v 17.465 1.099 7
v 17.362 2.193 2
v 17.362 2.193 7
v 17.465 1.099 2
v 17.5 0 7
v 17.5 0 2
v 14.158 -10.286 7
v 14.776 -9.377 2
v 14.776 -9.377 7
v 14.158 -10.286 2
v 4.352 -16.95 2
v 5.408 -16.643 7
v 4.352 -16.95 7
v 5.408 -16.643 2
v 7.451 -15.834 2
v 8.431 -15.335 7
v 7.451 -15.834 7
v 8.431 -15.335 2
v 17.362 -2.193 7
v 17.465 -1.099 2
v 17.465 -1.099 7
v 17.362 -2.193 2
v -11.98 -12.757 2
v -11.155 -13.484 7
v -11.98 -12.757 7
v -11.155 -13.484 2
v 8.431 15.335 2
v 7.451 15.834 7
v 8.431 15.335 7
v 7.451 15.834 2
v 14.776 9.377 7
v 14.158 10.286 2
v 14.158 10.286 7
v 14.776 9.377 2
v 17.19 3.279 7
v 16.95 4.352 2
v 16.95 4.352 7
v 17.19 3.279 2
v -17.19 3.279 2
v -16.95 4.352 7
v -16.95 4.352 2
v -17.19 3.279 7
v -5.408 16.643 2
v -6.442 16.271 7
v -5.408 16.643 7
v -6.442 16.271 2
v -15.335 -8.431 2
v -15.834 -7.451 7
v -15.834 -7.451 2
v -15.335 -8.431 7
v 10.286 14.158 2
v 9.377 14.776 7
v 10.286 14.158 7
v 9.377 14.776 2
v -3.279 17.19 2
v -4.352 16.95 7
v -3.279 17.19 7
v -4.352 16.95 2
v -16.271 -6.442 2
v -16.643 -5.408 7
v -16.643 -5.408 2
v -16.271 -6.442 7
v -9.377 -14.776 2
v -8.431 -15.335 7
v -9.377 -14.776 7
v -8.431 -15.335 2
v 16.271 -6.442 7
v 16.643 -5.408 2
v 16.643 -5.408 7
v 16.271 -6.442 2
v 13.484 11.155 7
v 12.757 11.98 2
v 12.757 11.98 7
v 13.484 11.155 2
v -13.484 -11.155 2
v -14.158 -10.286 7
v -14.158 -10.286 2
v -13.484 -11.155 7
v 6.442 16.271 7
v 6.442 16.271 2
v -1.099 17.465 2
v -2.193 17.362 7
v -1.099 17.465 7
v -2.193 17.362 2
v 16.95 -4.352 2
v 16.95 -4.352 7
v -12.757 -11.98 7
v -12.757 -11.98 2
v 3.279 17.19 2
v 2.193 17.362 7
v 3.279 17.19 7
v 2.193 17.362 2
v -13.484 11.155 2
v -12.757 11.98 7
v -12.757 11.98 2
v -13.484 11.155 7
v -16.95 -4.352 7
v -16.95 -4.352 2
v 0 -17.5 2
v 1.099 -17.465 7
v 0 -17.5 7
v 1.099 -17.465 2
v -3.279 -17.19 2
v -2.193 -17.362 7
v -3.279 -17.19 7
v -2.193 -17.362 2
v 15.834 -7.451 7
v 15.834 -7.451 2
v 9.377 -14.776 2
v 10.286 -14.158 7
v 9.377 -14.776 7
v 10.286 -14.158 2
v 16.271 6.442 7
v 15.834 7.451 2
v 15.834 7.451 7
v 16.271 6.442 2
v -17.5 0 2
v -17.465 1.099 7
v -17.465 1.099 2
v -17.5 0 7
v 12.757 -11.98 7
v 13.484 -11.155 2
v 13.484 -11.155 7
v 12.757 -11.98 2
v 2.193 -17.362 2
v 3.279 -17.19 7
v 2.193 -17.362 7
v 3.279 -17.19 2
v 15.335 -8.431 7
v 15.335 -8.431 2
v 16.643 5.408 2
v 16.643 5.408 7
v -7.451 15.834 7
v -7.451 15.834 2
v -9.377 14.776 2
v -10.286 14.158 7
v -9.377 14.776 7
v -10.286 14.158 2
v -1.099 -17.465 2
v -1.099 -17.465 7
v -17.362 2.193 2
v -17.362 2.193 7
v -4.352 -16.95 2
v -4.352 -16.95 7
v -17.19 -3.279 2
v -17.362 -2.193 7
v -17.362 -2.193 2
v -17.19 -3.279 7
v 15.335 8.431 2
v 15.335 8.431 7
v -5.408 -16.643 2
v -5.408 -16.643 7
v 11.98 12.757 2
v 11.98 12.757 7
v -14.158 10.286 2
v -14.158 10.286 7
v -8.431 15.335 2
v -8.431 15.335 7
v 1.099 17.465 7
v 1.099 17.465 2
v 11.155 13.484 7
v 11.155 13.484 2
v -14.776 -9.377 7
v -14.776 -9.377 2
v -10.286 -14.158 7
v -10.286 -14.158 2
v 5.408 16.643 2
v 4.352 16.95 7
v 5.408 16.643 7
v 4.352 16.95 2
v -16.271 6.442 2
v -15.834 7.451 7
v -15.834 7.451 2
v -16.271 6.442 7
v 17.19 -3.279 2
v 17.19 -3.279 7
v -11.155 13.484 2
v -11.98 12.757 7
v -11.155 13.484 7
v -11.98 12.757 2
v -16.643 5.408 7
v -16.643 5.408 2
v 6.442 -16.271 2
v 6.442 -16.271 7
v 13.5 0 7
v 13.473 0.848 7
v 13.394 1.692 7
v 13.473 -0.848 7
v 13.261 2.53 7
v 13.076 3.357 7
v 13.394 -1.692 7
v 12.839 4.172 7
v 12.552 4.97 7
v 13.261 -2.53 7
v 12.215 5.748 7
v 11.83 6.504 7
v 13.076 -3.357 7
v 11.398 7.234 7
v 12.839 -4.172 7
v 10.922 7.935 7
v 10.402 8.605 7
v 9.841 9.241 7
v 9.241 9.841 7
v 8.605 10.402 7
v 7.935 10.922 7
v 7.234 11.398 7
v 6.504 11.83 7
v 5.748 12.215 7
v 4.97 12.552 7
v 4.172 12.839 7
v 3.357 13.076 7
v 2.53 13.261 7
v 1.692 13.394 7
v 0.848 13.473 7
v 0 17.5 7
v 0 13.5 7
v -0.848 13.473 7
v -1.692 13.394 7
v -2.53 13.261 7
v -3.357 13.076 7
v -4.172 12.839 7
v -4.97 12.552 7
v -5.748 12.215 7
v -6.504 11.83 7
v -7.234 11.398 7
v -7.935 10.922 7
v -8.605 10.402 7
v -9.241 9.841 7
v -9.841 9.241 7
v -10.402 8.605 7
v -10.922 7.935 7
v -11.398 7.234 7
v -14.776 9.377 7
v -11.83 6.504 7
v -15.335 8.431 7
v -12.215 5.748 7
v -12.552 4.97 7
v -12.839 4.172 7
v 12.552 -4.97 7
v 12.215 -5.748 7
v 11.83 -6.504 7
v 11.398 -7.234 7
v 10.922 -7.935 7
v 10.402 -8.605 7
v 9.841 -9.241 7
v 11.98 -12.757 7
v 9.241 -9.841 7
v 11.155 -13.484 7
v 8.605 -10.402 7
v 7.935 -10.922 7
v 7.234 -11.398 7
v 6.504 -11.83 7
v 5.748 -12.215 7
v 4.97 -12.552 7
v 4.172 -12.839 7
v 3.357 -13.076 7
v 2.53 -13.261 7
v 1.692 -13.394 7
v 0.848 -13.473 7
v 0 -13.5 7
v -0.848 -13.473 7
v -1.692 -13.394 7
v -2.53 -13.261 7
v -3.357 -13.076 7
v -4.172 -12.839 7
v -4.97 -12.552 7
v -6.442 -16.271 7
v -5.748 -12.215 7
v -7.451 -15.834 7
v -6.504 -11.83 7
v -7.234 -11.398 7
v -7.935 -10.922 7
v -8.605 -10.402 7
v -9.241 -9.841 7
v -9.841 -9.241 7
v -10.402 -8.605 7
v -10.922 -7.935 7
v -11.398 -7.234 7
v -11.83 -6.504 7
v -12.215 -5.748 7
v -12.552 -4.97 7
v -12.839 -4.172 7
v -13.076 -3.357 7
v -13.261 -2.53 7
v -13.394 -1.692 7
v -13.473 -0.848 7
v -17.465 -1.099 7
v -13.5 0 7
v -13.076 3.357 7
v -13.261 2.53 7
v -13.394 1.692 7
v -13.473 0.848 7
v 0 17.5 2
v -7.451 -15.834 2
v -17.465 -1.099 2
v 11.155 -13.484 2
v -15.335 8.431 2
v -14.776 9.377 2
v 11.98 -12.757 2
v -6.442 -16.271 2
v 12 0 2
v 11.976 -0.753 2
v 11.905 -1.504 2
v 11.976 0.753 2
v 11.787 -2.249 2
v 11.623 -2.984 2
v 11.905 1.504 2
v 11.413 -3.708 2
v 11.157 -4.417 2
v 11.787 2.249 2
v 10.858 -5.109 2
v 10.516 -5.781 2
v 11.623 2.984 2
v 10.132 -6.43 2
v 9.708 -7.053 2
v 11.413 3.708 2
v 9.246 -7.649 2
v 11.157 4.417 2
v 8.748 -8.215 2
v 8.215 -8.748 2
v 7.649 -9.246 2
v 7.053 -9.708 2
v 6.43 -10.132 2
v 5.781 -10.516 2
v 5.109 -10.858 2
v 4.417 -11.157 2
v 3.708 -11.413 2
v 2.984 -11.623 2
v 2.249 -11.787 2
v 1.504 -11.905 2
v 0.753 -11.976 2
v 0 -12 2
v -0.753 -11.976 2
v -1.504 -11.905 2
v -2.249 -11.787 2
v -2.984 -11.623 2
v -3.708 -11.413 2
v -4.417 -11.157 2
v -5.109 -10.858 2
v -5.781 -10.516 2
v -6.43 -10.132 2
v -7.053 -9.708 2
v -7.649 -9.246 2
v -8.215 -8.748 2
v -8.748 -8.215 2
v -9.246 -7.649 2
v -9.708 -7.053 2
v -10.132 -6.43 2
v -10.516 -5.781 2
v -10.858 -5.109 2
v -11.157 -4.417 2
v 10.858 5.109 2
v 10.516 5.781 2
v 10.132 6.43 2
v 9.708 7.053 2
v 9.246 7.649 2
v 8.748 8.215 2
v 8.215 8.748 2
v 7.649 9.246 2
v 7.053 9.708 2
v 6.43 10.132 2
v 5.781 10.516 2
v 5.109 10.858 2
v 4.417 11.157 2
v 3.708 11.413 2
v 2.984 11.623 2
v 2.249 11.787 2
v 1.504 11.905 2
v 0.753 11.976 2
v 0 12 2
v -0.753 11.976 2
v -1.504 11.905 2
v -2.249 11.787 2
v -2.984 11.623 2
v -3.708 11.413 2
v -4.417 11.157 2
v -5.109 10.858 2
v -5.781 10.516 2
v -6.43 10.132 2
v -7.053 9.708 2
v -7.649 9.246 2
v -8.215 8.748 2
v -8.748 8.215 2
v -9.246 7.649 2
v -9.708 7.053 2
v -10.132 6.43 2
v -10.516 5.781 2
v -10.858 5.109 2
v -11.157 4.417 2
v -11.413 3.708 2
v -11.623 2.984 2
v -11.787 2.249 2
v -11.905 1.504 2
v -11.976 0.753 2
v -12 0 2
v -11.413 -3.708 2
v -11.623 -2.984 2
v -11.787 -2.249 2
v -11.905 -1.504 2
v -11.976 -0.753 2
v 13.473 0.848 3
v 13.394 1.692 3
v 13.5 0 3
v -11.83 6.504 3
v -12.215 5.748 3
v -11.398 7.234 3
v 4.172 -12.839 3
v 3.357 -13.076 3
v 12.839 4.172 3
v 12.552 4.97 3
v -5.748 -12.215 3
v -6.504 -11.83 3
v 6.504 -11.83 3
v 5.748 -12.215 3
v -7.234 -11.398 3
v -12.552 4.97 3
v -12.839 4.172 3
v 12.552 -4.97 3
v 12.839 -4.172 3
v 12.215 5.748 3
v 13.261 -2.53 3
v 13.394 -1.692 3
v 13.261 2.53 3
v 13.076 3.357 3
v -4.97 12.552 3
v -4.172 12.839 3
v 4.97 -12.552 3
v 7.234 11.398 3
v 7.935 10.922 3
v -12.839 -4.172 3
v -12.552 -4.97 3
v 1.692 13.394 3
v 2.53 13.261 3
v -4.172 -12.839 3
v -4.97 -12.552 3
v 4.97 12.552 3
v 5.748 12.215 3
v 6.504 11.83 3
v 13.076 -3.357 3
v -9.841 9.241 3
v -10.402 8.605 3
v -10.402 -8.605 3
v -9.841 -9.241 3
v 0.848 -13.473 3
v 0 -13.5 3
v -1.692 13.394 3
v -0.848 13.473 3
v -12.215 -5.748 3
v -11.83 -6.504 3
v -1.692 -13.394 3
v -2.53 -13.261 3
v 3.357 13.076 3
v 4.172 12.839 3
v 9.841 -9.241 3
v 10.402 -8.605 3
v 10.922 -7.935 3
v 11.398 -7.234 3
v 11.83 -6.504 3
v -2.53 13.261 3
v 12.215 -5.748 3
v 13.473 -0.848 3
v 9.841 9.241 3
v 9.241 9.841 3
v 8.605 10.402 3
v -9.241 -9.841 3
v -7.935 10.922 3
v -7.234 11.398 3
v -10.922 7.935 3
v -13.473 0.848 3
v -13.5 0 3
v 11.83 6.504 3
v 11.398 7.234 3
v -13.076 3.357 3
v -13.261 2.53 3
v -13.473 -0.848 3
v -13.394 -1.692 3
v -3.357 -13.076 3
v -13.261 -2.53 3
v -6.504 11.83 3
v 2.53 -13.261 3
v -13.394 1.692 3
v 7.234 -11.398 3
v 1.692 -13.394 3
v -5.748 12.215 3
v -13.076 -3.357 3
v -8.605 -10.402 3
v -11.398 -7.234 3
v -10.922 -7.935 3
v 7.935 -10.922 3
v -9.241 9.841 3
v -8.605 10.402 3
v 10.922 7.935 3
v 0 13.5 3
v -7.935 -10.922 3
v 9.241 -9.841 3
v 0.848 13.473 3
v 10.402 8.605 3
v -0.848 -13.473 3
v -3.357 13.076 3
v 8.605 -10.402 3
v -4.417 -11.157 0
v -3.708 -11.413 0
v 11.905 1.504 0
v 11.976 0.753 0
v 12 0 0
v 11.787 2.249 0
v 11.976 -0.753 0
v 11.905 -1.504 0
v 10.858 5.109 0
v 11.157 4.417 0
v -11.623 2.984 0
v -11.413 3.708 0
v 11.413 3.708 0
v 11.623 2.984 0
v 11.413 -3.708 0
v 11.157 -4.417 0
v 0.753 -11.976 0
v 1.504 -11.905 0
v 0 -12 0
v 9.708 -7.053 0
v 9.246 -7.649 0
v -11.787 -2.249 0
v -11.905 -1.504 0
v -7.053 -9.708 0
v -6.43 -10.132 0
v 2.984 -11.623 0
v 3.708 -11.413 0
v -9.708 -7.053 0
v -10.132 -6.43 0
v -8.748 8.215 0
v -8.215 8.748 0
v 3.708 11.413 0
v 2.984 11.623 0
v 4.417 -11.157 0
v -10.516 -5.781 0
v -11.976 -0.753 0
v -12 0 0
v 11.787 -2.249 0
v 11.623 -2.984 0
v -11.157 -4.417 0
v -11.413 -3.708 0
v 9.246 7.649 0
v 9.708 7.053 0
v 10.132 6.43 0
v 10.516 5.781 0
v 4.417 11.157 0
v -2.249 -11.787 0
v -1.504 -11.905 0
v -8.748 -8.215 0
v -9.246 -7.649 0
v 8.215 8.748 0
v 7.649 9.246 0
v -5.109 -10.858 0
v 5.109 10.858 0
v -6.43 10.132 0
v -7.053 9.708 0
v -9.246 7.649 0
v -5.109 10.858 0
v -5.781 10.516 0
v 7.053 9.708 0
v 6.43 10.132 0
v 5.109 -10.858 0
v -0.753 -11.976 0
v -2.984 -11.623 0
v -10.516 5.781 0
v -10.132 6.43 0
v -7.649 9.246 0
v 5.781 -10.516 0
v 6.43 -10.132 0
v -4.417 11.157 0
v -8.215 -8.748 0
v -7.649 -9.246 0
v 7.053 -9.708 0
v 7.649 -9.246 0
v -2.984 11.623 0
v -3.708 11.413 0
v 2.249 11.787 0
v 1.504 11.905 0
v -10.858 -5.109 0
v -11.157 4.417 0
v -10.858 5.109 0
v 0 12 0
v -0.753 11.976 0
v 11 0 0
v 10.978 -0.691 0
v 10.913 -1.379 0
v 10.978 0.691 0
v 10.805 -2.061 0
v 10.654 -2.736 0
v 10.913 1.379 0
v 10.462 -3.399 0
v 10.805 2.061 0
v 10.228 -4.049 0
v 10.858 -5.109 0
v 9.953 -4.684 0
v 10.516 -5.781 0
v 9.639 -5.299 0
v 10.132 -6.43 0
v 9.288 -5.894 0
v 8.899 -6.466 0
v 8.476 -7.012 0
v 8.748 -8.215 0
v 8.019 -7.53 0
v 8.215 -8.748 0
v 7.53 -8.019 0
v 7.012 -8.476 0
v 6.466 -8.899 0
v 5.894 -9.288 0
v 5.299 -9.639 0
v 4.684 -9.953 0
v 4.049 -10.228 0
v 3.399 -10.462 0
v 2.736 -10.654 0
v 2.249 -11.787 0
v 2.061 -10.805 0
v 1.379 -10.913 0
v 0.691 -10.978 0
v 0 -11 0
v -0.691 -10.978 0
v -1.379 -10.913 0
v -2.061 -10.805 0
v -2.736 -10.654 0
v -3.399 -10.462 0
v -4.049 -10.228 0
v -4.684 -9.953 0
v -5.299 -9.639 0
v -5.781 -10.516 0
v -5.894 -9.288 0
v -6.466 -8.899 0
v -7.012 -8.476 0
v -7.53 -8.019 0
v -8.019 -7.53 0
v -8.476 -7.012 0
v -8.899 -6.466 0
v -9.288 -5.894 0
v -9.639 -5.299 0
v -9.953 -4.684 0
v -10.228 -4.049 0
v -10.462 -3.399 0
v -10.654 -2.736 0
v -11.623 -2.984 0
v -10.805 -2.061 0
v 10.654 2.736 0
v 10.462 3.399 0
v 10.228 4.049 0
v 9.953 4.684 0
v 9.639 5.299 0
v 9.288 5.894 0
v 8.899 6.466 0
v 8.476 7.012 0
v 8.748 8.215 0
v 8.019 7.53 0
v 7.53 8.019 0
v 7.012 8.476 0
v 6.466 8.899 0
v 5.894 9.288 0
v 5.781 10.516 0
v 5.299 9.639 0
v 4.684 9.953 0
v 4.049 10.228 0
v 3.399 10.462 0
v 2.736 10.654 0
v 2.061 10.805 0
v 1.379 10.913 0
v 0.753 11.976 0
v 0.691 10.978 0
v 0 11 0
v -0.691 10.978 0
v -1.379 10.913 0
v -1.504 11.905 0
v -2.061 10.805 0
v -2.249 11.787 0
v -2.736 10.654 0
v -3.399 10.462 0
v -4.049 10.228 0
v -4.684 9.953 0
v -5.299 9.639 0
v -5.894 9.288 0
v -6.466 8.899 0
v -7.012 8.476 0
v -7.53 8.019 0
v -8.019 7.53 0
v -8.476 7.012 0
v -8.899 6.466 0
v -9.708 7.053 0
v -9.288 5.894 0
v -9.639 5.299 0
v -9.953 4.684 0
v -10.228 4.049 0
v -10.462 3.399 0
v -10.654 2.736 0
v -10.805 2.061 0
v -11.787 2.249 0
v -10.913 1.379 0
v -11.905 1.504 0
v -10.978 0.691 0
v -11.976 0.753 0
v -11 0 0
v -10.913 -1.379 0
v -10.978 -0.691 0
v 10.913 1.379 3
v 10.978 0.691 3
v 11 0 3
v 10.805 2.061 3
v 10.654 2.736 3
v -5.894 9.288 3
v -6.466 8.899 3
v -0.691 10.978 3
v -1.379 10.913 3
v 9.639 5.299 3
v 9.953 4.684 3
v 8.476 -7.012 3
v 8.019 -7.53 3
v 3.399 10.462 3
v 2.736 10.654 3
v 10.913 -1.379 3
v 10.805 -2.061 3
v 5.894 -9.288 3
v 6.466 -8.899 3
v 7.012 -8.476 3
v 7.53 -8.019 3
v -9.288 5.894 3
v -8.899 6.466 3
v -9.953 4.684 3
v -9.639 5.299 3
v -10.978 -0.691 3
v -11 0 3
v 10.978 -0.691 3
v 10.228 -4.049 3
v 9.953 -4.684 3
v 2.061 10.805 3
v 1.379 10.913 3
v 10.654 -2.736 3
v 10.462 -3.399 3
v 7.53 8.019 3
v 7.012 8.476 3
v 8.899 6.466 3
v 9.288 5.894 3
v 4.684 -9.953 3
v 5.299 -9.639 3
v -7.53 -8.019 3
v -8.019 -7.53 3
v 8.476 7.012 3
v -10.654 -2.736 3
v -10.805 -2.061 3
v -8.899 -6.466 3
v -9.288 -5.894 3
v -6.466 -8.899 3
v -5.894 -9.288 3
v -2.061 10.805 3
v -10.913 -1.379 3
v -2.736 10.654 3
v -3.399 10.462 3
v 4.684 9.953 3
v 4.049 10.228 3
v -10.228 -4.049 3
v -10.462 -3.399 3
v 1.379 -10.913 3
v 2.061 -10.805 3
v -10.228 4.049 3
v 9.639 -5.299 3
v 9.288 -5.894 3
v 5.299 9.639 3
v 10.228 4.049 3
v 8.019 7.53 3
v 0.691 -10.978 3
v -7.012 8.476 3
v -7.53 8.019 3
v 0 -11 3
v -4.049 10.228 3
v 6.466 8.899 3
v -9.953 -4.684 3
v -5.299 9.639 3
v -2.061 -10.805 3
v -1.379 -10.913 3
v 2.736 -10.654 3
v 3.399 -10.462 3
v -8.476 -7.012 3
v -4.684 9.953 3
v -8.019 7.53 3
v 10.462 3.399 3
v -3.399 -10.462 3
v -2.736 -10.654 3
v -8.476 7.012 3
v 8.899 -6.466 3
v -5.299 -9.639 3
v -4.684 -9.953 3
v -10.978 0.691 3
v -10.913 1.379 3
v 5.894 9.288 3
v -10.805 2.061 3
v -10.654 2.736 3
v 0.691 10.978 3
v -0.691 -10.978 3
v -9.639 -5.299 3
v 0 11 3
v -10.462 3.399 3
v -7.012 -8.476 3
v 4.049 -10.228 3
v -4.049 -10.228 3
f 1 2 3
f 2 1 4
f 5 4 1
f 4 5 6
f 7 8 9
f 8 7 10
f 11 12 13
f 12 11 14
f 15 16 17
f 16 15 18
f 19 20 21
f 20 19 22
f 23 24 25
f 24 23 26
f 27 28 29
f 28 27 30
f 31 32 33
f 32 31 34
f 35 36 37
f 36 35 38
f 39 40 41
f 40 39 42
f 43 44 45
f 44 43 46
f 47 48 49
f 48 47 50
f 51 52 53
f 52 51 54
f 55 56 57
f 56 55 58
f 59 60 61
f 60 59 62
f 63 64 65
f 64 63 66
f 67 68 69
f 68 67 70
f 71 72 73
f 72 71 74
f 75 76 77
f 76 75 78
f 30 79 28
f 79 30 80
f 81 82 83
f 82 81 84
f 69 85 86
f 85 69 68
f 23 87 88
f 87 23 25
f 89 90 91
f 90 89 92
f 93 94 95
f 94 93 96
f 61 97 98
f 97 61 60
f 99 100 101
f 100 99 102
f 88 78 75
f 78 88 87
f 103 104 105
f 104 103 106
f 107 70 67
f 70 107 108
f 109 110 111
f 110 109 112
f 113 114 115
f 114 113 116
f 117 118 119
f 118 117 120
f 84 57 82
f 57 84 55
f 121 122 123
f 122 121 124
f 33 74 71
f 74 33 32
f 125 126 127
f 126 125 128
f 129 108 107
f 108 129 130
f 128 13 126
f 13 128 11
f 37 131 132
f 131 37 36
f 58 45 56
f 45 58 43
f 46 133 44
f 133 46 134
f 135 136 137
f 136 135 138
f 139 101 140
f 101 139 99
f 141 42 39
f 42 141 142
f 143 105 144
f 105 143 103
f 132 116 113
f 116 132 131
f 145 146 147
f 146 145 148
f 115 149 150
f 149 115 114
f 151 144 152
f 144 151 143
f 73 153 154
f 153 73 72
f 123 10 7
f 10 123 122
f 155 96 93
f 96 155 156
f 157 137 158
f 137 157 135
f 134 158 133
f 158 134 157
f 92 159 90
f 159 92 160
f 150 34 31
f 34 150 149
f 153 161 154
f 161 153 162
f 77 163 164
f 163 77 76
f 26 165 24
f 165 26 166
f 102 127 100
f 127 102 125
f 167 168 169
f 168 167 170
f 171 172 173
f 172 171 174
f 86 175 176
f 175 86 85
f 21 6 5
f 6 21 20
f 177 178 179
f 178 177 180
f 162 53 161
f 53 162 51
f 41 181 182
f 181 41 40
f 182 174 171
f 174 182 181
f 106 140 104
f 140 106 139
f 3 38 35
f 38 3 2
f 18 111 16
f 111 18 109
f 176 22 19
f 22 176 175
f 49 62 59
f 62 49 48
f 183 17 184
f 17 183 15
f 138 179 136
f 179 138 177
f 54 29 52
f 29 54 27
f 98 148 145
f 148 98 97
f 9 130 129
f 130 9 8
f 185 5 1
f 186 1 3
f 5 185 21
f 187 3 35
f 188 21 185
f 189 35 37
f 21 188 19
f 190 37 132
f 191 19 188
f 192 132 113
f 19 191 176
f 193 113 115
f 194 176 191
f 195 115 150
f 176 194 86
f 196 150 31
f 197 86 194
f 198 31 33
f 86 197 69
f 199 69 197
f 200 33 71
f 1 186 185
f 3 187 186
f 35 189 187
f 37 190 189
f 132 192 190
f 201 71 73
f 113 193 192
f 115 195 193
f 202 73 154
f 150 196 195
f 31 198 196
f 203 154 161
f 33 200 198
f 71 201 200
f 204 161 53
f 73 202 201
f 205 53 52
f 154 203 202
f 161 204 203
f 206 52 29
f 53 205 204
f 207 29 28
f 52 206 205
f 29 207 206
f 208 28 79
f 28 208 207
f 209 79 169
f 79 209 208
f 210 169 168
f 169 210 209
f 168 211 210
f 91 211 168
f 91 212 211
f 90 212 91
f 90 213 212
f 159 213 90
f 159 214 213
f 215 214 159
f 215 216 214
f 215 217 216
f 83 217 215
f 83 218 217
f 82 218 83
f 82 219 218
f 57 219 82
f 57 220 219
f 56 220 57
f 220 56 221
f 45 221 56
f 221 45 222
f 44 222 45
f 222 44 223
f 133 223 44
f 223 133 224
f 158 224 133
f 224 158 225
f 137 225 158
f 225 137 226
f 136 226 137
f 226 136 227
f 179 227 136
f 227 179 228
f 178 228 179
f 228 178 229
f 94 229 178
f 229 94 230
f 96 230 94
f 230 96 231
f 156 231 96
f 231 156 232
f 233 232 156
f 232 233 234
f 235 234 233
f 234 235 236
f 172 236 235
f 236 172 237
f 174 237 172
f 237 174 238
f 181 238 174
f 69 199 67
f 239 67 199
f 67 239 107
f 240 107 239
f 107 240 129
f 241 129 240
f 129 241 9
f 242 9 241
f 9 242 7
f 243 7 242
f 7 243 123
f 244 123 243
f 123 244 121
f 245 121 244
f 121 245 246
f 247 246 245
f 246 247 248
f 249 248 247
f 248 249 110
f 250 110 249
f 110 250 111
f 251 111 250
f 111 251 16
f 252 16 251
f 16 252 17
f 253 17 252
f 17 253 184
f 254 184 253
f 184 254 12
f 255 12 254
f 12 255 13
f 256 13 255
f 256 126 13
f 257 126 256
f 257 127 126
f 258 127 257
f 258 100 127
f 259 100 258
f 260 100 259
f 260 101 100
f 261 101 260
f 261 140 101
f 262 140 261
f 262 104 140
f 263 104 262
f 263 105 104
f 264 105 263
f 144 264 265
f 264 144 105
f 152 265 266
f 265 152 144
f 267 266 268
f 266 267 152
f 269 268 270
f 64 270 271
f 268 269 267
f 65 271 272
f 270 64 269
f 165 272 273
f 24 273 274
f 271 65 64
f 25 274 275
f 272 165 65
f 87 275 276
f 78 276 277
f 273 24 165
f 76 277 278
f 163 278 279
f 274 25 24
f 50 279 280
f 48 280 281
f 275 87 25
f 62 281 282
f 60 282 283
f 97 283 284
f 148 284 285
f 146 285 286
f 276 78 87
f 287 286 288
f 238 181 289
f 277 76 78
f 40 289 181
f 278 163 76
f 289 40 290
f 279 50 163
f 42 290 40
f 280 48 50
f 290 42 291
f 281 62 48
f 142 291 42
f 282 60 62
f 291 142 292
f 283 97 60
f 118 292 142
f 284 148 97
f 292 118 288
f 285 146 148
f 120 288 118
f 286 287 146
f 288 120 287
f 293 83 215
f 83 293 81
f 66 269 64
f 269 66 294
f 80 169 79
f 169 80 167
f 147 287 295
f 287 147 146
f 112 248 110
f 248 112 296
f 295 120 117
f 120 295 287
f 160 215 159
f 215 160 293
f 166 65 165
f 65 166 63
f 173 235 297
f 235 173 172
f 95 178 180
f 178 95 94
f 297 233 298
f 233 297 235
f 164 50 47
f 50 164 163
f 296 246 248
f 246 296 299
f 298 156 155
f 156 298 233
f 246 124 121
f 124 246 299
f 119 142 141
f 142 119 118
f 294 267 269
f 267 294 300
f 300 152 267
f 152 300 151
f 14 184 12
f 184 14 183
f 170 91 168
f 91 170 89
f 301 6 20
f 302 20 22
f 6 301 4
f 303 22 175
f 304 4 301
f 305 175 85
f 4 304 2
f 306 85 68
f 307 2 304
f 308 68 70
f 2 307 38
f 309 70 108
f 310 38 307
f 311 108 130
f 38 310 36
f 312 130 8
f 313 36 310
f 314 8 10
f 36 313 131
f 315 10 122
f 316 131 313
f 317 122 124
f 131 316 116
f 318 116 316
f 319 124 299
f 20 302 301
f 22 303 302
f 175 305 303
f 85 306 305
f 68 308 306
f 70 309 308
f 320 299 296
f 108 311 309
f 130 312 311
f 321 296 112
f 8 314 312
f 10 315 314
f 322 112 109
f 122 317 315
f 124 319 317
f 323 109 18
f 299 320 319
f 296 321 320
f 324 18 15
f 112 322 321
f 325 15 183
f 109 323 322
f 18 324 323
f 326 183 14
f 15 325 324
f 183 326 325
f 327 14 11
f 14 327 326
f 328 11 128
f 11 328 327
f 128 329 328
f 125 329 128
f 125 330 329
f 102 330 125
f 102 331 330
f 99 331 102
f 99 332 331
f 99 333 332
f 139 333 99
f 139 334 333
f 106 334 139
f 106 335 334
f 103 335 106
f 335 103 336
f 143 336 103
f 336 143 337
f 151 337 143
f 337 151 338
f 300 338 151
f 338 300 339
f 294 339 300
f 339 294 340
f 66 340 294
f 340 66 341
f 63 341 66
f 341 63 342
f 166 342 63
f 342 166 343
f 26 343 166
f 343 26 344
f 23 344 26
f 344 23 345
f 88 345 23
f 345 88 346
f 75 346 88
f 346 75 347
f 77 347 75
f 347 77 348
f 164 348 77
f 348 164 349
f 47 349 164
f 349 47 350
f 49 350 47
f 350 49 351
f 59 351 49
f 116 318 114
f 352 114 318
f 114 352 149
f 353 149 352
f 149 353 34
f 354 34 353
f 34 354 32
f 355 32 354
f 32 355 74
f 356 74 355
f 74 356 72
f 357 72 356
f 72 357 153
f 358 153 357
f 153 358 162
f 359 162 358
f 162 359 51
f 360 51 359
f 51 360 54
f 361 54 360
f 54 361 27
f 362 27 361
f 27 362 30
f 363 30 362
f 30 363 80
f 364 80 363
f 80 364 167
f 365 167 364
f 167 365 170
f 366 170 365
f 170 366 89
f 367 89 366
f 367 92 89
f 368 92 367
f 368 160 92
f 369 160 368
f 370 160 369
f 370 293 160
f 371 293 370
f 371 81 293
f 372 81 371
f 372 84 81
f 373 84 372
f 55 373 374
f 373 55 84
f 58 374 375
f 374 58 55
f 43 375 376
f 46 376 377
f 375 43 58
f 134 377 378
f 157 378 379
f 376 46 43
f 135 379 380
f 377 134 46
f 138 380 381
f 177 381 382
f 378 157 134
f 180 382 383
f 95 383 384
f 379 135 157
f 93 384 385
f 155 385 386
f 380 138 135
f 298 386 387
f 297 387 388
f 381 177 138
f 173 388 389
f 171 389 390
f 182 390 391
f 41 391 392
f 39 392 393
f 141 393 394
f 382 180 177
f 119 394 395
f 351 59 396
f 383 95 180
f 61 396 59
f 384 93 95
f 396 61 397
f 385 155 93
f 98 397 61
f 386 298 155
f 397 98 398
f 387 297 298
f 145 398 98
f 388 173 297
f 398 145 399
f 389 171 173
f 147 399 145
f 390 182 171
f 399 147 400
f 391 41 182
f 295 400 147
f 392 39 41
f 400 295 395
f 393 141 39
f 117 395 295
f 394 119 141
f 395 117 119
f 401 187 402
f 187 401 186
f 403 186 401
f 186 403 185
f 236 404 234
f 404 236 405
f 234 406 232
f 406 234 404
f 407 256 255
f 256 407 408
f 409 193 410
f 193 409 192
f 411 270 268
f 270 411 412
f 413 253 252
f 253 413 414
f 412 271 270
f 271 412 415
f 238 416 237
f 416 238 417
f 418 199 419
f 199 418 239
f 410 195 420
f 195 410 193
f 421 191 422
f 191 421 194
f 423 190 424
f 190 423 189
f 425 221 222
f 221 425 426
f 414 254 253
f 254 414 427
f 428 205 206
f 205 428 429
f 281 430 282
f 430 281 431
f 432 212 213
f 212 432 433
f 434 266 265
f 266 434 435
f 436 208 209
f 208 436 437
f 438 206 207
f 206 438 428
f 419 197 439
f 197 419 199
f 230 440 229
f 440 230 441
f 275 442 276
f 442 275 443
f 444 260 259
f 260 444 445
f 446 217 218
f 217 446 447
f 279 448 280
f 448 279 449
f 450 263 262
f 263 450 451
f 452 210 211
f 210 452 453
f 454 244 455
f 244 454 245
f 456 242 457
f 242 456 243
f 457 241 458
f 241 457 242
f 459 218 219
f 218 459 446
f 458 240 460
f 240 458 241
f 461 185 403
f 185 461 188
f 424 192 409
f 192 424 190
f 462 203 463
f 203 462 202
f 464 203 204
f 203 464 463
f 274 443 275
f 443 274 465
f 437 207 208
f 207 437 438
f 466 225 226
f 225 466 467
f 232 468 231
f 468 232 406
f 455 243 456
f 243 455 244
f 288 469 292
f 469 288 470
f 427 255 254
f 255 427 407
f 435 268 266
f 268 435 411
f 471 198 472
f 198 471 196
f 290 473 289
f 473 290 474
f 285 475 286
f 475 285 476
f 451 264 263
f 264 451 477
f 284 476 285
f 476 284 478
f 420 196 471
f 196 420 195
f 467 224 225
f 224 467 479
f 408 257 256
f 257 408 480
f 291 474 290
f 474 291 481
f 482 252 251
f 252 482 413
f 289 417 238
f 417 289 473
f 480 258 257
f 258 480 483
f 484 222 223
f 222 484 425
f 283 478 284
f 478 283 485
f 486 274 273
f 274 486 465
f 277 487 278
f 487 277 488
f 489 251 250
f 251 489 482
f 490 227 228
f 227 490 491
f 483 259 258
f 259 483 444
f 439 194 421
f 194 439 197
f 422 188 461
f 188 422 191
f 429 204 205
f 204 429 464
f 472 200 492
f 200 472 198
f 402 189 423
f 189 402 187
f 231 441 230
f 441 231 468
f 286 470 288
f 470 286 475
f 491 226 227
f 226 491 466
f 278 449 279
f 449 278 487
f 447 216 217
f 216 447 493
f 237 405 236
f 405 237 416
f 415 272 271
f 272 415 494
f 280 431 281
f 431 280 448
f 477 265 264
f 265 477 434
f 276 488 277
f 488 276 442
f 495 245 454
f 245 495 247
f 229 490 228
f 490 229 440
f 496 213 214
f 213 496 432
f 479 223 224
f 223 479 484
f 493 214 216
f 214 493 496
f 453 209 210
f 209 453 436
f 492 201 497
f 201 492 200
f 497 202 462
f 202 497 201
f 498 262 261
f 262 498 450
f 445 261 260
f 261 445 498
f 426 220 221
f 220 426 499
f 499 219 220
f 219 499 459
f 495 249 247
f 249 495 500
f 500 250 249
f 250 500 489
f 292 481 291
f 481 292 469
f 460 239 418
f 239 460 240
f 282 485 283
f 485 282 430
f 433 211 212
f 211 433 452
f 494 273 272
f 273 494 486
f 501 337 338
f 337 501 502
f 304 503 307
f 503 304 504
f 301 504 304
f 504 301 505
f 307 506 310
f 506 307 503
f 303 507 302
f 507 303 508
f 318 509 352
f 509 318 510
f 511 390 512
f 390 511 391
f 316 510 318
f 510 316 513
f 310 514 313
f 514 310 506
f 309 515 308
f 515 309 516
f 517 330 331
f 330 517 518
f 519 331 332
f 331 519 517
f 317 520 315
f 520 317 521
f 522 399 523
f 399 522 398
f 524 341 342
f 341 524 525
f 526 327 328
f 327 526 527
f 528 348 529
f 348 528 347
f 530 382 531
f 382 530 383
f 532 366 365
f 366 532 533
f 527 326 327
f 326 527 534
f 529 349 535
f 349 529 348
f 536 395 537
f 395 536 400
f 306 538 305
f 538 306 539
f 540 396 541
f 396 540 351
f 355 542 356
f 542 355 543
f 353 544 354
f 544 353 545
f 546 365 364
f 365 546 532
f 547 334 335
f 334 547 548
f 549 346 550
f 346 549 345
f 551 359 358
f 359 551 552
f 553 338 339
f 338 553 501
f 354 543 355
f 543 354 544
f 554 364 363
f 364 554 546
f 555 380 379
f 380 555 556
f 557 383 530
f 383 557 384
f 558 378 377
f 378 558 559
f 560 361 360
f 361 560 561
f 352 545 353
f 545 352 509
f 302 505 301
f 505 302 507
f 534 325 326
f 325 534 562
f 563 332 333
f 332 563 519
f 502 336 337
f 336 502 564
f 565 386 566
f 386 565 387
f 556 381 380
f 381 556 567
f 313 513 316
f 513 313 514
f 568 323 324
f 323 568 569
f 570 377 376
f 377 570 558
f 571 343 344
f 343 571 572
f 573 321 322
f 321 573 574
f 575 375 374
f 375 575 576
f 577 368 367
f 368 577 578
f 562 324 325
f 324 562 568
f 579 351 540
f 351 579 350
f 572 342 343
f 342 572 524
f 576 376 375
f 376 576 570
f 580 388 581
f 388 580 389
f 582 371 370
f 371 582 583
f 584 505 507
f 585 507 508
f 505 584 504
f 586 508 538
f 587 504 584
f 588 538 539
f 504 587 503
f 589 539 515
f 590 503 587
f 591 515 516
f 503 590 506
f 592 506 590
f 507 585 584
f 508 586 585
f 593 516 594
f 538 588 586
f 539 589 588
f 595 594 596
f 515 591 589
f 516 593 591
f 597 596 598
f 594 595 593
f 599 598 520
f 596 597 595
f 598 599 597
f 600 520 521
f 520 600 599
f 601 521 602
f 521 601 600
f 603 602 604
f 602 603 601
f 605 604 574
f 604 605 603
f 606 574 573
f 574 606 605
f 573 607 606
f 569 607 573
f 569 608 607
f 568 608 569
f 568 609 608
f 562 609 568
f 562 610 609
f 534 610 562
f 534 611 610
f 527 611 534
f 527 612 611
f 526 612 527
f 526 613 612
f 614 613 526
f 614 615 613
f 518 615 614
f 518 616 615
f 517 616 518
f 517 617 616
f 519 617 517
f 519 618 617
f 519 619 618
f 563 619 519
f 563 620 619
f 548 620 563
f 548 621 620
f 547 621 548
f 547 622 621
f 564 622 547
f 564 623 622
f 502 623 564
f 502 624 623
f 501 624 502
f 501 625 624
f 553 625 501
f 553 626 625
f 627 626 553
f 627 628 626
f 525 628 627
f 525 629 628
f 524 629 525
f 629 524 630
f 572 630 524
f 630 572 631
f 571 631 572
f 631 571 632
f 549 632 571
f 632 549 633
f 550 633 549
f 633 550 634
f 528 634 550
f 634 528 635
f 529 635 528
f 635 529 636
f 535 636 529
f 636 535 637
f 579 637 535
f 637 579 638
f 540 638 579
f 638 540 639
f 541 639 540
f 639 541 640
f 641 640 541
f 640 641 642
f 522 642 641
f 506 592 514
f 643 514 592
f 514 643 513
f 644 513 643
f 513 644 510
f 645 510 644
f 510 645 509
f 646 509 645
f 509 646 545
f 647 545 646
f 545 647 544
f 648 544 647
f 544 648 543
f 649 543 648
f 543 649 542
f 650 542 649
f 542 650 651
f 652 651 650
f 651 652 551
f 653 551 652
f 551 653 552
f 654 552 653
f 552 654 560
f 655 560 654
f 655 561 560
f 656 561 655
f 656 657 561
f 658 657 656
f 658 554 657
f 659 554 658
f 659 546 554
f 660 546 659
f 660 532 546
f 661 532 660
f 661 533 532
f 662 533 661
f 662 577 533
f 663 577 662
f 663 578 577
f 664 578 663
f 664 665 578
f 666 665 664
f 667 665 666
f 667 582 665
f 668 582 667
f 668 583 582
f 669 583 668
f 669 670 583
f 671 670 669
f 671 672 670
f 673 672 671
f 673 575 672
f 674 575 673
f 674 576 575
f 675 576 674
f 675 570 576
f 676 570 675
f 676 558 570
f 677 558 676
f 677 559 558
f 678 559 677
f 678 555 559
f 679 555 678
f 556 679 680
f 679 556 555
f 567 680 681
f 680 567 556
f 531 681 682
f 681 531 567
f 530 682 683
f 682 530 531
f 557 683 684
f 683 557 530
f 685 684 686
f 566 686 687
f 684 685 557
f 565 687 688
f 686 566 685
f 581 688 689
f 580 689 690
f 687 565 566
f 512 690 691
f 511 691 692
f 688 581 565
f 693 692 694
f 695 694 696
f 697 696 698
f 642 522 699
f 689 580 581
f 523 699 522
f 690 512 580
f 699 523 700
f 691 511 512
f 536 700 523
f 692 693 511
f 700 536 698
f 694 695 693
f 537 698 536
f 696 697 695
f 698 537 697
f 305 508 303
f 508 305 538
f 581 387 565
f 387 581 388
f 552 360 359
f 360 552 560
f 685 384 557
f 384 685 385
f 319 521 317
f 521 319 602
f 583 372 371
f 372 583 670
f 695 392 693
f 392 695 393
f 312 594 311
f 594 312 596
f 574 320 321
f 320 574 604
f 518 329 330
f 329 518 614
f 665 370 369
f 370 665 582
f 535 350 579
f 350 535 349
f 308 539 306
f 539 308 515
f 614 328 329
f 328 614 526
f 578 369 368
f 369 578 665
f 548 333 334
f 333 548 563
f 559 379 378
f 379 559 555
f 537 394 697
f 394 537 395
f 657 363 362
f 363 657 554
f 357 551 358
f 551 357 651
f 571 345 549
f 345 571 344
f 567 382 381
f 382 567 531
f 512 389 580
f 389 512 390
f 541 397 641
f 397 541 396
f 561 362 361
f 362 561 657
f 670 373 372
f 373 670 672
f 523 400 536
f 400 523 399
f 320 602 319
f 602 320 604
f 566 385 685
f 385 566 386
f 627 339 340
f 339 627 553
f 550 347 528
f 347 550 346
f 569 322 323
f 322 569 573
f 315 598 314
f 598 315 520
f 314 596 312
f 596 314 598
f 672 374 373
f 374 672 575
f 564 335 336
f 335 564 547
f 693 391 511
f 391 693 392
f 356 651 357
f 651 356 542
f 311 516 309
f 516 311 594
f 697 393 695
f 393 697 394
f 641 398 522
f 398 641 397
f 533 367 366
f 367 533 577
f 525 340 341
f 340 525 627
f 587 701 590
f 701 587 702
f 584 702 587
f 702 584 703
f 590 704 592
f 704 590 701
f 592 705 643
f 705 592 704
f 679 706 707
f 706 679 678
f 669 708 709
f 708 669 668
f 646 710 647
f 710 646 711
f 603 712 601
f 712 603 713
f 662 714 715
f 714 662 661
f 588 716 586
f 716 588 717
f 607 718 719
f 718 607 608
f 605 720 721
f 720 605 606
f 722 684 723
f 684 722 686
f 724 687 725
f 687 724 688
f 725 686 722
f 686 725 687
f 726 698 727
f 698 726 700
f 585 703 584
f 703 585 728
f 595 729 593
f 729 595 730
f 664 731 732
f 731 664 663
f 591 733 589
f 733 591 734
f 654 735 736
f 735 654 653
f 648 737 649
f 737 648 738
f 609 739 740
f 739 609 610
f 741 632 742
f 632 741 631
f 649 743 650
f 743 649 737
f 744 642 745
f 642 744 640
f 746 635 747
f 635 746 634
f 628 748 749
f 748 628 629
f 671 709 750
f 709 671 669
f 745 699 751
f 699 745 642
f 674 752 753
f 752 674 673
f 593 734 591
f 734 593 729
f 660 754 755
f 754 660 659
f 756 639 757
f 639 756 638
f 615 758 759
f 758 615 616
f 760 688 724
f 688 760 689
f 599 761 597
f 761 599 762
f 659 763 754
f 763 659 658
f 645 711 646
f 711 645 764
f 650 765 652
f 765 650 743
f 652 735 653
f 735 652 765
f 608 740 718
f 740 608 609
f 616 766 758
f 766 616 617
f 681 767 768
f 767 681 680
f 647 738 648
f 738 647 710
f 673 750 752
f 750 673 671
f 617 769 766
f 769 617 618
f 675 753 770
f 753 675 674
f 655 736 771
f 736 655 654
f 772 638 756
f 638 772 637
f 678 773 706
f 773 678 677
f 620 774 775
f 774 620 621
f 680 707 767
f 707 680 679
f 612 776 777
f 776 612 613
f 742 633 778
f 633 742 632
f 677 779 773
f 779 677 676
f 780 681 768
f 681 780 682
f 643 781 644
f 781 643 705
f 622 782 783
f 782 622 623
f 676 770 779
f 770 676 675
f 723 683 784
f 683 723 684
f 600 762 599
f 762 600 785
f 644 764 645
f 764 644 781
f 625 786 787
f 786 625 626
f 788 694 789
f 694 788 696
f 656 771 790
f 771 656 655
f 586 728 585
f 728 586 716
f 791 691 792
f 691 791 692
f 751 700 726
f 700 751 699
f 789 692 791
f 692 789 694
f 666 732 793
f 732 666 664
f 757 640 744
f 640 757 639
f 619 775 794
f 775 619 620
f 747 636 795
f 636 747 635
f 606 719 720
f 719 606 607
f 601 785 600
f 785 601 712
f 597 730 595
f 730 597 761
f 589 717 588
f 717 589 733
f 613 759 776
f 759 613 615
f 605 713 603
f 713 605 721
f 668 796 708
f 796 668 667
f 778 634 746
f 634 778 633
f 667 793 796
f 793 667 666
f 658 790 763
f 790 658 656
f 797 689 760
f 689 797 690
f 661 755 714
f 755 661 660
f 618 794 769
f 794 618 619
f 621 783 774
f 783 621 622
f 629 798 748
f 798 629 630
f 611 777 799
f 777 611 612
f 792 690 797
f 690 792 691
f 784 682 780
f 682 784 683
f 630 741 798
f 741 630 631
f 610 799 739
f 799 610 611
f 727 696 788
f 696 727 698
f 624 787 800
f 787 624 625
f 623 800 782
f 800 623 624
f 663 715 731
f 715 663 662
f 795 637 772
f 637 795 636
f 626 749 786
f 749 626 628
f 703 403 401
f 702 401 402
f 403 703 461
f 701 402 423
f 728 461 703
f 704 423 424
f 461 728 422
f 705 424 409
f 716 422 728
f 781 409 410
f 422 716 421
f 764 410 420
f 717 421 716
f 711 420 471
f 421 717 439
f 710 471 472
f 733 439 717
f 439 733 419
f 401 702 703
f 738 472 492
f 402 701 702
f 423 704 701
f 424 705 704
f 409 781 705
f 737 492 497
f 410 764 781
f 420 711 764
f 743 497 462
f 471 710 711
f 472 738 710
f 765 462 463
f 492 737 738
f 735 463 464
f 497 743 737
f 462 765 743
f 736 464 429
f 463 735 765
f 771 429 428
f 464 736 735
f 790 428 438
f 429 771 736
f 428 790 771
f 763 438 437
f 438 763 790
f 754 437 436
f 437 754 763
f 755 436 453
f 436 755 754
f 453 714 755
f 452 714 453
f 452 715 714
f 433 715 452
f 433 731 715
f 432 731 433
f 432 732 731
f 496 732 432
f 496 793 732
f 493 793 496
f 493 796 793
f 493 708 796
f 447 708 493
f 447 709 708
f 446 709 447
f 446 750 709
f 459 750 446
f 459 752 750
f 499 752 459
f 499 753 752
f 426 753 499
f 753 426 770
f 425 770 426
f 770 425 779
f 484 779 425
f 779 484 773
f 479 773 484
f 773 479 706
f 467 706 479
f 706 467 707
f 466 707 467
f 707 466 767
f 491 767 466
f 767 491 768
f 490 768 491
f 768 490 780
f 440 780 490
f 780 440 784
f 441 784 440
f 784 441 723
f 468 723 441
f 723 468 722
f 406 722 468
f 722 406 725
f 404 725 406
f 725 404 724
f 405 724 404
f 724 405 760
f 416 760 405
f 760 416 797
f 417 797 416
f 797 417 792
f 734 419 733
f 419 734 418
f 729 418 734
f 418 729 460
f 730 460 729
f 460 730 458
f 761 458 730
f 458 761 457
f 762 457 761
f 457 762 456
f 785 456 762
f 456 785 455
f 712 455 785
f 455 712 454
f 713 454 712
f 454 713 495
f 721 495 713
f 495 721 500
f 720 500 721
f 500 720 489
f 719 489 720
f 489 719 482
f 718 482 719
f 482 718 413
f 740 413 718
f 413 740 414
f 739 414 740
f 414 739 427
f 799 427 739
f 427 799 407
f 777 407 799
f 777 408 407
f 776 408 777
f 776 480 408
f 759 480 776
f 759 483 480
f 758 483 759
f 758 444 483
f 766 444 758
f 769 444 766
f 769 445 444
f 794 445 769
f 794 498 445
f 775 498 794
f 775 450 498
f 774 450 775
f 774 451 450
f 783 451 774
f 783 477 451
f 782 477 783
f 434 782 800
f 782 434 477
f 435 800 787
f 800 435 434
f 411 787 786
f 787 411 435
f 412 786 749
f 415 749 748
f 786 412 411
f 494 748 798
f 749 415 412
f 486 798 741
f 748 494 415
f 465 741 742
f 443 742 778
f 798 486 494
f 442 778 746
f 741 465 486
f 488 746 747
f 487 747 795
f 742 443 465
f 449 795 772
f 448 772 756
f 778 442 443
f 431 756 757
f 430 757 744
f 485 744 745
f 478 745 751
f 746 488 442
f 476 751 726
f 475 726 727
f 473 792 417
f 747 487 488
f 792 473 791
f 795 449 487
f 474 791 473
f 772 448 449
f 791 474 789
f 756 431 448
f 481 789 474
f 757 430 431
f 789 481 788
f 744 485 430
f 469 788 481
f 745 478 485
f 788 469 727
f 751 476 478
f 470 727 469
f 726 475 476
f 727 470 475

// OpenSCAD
$fn = 100;

extenstionWidth = 2;
shellThickness = 1;

lipExtenstion = (extenstionWidth * 2);

lenseBodyID = 33;
lensInsertHeight = 2;
lenseLipOD = lenseBodyID + lipExtenstion;

mountBodyID = 35;
mountInsertHeight=2;
mountInsertLip= mountBodyID + lipExtenstion;

frontID = lenseBodyID - 2 * shellThickness;

scopeInsertOD = 27;


anchorHeight = 5;
anchorHoleID = 24;
anchorDrop = 2;
anchorCollarOD = 35;




//head();
foot();
//anchorInsert();


module head() {
    translate ([0,0,- anchorHeight / 2]) anchorCollar();
    difference() {
        union() {
            lensIntergation();
            translate ([0,0,mountInsertHeight / 2 - 0.5]) anchorFoot();
        }
        cylinder(h=20, d = anchorHoleID - 2, center = true);
    }
}

module foot() {
    difference() {
        union() {
            translate ([0,0,anchorHeight / 2 + mountInsertHeight]) anchorCollar();
            translate ([0,0,shellThickness / 2 + mountInsertHeight]) anchorFoot();
            #translate ([0,0,mountInsertHeight / 2]) anchorInsert();
        }
        cylinder(h=20, d = anchorHoleID - 2, center = true);
    }
}

module anchorFoot() {
    cylinder(h=shellThickness, d = anchorCollarOD, center = true);
}

module anchorCollar() {
    difference() {
        cylinder(h=anchorHeight, d = anchorCollarOD, center = true);
        cylinder(h=anchorHeight + 2, d = scopeInsertOD, center = true);
    }
}


module anchorInsert() {
    difference() {
        cylinder(h=mountInsertHeight, d = anchorHoleID, center = true);
        cylinder(h=mountInsertHeight + 2, d = anchorHoleID - 2, center = true);
    }
}

module lensIntergation() {
    union() {
        translate ([0,0,5]) lenseInsert();
        translate ([0,0,3]) bodyLip();
        translate ([0,0,1]) bodyInsert();
    }
}

module bodyLip() {
    difference() {
        cylinder(h=mountInsertHeight, d = mountInsertLip, center = true);
        cylinder(h=mountInsertHeight + 2, d = frontID, center = true);
    }
}

module lensLip() {
    difference() {
        cylinder(h=lensInsertHeight, d = lenseLipOD, center = true);
        cylinder(h=lensInsertHeight + 2, d = frontID, center = true);
    }
}


module bodyInsert() {
    difference() {
        cylinder(h=mountInsertHeight, d = mountBodyID, center = true);
        cylinder(h=mountInsertHeight + 2, d = frontID, center = true);
    }
}

module lenseInsert() {
    difference() {
        cylinder(h=lensInsertHeight, d = lenseBodyID, center = true);
        cylinder(h=lensInsertHeight + 2, d = frontID, center = true);
    }
}
